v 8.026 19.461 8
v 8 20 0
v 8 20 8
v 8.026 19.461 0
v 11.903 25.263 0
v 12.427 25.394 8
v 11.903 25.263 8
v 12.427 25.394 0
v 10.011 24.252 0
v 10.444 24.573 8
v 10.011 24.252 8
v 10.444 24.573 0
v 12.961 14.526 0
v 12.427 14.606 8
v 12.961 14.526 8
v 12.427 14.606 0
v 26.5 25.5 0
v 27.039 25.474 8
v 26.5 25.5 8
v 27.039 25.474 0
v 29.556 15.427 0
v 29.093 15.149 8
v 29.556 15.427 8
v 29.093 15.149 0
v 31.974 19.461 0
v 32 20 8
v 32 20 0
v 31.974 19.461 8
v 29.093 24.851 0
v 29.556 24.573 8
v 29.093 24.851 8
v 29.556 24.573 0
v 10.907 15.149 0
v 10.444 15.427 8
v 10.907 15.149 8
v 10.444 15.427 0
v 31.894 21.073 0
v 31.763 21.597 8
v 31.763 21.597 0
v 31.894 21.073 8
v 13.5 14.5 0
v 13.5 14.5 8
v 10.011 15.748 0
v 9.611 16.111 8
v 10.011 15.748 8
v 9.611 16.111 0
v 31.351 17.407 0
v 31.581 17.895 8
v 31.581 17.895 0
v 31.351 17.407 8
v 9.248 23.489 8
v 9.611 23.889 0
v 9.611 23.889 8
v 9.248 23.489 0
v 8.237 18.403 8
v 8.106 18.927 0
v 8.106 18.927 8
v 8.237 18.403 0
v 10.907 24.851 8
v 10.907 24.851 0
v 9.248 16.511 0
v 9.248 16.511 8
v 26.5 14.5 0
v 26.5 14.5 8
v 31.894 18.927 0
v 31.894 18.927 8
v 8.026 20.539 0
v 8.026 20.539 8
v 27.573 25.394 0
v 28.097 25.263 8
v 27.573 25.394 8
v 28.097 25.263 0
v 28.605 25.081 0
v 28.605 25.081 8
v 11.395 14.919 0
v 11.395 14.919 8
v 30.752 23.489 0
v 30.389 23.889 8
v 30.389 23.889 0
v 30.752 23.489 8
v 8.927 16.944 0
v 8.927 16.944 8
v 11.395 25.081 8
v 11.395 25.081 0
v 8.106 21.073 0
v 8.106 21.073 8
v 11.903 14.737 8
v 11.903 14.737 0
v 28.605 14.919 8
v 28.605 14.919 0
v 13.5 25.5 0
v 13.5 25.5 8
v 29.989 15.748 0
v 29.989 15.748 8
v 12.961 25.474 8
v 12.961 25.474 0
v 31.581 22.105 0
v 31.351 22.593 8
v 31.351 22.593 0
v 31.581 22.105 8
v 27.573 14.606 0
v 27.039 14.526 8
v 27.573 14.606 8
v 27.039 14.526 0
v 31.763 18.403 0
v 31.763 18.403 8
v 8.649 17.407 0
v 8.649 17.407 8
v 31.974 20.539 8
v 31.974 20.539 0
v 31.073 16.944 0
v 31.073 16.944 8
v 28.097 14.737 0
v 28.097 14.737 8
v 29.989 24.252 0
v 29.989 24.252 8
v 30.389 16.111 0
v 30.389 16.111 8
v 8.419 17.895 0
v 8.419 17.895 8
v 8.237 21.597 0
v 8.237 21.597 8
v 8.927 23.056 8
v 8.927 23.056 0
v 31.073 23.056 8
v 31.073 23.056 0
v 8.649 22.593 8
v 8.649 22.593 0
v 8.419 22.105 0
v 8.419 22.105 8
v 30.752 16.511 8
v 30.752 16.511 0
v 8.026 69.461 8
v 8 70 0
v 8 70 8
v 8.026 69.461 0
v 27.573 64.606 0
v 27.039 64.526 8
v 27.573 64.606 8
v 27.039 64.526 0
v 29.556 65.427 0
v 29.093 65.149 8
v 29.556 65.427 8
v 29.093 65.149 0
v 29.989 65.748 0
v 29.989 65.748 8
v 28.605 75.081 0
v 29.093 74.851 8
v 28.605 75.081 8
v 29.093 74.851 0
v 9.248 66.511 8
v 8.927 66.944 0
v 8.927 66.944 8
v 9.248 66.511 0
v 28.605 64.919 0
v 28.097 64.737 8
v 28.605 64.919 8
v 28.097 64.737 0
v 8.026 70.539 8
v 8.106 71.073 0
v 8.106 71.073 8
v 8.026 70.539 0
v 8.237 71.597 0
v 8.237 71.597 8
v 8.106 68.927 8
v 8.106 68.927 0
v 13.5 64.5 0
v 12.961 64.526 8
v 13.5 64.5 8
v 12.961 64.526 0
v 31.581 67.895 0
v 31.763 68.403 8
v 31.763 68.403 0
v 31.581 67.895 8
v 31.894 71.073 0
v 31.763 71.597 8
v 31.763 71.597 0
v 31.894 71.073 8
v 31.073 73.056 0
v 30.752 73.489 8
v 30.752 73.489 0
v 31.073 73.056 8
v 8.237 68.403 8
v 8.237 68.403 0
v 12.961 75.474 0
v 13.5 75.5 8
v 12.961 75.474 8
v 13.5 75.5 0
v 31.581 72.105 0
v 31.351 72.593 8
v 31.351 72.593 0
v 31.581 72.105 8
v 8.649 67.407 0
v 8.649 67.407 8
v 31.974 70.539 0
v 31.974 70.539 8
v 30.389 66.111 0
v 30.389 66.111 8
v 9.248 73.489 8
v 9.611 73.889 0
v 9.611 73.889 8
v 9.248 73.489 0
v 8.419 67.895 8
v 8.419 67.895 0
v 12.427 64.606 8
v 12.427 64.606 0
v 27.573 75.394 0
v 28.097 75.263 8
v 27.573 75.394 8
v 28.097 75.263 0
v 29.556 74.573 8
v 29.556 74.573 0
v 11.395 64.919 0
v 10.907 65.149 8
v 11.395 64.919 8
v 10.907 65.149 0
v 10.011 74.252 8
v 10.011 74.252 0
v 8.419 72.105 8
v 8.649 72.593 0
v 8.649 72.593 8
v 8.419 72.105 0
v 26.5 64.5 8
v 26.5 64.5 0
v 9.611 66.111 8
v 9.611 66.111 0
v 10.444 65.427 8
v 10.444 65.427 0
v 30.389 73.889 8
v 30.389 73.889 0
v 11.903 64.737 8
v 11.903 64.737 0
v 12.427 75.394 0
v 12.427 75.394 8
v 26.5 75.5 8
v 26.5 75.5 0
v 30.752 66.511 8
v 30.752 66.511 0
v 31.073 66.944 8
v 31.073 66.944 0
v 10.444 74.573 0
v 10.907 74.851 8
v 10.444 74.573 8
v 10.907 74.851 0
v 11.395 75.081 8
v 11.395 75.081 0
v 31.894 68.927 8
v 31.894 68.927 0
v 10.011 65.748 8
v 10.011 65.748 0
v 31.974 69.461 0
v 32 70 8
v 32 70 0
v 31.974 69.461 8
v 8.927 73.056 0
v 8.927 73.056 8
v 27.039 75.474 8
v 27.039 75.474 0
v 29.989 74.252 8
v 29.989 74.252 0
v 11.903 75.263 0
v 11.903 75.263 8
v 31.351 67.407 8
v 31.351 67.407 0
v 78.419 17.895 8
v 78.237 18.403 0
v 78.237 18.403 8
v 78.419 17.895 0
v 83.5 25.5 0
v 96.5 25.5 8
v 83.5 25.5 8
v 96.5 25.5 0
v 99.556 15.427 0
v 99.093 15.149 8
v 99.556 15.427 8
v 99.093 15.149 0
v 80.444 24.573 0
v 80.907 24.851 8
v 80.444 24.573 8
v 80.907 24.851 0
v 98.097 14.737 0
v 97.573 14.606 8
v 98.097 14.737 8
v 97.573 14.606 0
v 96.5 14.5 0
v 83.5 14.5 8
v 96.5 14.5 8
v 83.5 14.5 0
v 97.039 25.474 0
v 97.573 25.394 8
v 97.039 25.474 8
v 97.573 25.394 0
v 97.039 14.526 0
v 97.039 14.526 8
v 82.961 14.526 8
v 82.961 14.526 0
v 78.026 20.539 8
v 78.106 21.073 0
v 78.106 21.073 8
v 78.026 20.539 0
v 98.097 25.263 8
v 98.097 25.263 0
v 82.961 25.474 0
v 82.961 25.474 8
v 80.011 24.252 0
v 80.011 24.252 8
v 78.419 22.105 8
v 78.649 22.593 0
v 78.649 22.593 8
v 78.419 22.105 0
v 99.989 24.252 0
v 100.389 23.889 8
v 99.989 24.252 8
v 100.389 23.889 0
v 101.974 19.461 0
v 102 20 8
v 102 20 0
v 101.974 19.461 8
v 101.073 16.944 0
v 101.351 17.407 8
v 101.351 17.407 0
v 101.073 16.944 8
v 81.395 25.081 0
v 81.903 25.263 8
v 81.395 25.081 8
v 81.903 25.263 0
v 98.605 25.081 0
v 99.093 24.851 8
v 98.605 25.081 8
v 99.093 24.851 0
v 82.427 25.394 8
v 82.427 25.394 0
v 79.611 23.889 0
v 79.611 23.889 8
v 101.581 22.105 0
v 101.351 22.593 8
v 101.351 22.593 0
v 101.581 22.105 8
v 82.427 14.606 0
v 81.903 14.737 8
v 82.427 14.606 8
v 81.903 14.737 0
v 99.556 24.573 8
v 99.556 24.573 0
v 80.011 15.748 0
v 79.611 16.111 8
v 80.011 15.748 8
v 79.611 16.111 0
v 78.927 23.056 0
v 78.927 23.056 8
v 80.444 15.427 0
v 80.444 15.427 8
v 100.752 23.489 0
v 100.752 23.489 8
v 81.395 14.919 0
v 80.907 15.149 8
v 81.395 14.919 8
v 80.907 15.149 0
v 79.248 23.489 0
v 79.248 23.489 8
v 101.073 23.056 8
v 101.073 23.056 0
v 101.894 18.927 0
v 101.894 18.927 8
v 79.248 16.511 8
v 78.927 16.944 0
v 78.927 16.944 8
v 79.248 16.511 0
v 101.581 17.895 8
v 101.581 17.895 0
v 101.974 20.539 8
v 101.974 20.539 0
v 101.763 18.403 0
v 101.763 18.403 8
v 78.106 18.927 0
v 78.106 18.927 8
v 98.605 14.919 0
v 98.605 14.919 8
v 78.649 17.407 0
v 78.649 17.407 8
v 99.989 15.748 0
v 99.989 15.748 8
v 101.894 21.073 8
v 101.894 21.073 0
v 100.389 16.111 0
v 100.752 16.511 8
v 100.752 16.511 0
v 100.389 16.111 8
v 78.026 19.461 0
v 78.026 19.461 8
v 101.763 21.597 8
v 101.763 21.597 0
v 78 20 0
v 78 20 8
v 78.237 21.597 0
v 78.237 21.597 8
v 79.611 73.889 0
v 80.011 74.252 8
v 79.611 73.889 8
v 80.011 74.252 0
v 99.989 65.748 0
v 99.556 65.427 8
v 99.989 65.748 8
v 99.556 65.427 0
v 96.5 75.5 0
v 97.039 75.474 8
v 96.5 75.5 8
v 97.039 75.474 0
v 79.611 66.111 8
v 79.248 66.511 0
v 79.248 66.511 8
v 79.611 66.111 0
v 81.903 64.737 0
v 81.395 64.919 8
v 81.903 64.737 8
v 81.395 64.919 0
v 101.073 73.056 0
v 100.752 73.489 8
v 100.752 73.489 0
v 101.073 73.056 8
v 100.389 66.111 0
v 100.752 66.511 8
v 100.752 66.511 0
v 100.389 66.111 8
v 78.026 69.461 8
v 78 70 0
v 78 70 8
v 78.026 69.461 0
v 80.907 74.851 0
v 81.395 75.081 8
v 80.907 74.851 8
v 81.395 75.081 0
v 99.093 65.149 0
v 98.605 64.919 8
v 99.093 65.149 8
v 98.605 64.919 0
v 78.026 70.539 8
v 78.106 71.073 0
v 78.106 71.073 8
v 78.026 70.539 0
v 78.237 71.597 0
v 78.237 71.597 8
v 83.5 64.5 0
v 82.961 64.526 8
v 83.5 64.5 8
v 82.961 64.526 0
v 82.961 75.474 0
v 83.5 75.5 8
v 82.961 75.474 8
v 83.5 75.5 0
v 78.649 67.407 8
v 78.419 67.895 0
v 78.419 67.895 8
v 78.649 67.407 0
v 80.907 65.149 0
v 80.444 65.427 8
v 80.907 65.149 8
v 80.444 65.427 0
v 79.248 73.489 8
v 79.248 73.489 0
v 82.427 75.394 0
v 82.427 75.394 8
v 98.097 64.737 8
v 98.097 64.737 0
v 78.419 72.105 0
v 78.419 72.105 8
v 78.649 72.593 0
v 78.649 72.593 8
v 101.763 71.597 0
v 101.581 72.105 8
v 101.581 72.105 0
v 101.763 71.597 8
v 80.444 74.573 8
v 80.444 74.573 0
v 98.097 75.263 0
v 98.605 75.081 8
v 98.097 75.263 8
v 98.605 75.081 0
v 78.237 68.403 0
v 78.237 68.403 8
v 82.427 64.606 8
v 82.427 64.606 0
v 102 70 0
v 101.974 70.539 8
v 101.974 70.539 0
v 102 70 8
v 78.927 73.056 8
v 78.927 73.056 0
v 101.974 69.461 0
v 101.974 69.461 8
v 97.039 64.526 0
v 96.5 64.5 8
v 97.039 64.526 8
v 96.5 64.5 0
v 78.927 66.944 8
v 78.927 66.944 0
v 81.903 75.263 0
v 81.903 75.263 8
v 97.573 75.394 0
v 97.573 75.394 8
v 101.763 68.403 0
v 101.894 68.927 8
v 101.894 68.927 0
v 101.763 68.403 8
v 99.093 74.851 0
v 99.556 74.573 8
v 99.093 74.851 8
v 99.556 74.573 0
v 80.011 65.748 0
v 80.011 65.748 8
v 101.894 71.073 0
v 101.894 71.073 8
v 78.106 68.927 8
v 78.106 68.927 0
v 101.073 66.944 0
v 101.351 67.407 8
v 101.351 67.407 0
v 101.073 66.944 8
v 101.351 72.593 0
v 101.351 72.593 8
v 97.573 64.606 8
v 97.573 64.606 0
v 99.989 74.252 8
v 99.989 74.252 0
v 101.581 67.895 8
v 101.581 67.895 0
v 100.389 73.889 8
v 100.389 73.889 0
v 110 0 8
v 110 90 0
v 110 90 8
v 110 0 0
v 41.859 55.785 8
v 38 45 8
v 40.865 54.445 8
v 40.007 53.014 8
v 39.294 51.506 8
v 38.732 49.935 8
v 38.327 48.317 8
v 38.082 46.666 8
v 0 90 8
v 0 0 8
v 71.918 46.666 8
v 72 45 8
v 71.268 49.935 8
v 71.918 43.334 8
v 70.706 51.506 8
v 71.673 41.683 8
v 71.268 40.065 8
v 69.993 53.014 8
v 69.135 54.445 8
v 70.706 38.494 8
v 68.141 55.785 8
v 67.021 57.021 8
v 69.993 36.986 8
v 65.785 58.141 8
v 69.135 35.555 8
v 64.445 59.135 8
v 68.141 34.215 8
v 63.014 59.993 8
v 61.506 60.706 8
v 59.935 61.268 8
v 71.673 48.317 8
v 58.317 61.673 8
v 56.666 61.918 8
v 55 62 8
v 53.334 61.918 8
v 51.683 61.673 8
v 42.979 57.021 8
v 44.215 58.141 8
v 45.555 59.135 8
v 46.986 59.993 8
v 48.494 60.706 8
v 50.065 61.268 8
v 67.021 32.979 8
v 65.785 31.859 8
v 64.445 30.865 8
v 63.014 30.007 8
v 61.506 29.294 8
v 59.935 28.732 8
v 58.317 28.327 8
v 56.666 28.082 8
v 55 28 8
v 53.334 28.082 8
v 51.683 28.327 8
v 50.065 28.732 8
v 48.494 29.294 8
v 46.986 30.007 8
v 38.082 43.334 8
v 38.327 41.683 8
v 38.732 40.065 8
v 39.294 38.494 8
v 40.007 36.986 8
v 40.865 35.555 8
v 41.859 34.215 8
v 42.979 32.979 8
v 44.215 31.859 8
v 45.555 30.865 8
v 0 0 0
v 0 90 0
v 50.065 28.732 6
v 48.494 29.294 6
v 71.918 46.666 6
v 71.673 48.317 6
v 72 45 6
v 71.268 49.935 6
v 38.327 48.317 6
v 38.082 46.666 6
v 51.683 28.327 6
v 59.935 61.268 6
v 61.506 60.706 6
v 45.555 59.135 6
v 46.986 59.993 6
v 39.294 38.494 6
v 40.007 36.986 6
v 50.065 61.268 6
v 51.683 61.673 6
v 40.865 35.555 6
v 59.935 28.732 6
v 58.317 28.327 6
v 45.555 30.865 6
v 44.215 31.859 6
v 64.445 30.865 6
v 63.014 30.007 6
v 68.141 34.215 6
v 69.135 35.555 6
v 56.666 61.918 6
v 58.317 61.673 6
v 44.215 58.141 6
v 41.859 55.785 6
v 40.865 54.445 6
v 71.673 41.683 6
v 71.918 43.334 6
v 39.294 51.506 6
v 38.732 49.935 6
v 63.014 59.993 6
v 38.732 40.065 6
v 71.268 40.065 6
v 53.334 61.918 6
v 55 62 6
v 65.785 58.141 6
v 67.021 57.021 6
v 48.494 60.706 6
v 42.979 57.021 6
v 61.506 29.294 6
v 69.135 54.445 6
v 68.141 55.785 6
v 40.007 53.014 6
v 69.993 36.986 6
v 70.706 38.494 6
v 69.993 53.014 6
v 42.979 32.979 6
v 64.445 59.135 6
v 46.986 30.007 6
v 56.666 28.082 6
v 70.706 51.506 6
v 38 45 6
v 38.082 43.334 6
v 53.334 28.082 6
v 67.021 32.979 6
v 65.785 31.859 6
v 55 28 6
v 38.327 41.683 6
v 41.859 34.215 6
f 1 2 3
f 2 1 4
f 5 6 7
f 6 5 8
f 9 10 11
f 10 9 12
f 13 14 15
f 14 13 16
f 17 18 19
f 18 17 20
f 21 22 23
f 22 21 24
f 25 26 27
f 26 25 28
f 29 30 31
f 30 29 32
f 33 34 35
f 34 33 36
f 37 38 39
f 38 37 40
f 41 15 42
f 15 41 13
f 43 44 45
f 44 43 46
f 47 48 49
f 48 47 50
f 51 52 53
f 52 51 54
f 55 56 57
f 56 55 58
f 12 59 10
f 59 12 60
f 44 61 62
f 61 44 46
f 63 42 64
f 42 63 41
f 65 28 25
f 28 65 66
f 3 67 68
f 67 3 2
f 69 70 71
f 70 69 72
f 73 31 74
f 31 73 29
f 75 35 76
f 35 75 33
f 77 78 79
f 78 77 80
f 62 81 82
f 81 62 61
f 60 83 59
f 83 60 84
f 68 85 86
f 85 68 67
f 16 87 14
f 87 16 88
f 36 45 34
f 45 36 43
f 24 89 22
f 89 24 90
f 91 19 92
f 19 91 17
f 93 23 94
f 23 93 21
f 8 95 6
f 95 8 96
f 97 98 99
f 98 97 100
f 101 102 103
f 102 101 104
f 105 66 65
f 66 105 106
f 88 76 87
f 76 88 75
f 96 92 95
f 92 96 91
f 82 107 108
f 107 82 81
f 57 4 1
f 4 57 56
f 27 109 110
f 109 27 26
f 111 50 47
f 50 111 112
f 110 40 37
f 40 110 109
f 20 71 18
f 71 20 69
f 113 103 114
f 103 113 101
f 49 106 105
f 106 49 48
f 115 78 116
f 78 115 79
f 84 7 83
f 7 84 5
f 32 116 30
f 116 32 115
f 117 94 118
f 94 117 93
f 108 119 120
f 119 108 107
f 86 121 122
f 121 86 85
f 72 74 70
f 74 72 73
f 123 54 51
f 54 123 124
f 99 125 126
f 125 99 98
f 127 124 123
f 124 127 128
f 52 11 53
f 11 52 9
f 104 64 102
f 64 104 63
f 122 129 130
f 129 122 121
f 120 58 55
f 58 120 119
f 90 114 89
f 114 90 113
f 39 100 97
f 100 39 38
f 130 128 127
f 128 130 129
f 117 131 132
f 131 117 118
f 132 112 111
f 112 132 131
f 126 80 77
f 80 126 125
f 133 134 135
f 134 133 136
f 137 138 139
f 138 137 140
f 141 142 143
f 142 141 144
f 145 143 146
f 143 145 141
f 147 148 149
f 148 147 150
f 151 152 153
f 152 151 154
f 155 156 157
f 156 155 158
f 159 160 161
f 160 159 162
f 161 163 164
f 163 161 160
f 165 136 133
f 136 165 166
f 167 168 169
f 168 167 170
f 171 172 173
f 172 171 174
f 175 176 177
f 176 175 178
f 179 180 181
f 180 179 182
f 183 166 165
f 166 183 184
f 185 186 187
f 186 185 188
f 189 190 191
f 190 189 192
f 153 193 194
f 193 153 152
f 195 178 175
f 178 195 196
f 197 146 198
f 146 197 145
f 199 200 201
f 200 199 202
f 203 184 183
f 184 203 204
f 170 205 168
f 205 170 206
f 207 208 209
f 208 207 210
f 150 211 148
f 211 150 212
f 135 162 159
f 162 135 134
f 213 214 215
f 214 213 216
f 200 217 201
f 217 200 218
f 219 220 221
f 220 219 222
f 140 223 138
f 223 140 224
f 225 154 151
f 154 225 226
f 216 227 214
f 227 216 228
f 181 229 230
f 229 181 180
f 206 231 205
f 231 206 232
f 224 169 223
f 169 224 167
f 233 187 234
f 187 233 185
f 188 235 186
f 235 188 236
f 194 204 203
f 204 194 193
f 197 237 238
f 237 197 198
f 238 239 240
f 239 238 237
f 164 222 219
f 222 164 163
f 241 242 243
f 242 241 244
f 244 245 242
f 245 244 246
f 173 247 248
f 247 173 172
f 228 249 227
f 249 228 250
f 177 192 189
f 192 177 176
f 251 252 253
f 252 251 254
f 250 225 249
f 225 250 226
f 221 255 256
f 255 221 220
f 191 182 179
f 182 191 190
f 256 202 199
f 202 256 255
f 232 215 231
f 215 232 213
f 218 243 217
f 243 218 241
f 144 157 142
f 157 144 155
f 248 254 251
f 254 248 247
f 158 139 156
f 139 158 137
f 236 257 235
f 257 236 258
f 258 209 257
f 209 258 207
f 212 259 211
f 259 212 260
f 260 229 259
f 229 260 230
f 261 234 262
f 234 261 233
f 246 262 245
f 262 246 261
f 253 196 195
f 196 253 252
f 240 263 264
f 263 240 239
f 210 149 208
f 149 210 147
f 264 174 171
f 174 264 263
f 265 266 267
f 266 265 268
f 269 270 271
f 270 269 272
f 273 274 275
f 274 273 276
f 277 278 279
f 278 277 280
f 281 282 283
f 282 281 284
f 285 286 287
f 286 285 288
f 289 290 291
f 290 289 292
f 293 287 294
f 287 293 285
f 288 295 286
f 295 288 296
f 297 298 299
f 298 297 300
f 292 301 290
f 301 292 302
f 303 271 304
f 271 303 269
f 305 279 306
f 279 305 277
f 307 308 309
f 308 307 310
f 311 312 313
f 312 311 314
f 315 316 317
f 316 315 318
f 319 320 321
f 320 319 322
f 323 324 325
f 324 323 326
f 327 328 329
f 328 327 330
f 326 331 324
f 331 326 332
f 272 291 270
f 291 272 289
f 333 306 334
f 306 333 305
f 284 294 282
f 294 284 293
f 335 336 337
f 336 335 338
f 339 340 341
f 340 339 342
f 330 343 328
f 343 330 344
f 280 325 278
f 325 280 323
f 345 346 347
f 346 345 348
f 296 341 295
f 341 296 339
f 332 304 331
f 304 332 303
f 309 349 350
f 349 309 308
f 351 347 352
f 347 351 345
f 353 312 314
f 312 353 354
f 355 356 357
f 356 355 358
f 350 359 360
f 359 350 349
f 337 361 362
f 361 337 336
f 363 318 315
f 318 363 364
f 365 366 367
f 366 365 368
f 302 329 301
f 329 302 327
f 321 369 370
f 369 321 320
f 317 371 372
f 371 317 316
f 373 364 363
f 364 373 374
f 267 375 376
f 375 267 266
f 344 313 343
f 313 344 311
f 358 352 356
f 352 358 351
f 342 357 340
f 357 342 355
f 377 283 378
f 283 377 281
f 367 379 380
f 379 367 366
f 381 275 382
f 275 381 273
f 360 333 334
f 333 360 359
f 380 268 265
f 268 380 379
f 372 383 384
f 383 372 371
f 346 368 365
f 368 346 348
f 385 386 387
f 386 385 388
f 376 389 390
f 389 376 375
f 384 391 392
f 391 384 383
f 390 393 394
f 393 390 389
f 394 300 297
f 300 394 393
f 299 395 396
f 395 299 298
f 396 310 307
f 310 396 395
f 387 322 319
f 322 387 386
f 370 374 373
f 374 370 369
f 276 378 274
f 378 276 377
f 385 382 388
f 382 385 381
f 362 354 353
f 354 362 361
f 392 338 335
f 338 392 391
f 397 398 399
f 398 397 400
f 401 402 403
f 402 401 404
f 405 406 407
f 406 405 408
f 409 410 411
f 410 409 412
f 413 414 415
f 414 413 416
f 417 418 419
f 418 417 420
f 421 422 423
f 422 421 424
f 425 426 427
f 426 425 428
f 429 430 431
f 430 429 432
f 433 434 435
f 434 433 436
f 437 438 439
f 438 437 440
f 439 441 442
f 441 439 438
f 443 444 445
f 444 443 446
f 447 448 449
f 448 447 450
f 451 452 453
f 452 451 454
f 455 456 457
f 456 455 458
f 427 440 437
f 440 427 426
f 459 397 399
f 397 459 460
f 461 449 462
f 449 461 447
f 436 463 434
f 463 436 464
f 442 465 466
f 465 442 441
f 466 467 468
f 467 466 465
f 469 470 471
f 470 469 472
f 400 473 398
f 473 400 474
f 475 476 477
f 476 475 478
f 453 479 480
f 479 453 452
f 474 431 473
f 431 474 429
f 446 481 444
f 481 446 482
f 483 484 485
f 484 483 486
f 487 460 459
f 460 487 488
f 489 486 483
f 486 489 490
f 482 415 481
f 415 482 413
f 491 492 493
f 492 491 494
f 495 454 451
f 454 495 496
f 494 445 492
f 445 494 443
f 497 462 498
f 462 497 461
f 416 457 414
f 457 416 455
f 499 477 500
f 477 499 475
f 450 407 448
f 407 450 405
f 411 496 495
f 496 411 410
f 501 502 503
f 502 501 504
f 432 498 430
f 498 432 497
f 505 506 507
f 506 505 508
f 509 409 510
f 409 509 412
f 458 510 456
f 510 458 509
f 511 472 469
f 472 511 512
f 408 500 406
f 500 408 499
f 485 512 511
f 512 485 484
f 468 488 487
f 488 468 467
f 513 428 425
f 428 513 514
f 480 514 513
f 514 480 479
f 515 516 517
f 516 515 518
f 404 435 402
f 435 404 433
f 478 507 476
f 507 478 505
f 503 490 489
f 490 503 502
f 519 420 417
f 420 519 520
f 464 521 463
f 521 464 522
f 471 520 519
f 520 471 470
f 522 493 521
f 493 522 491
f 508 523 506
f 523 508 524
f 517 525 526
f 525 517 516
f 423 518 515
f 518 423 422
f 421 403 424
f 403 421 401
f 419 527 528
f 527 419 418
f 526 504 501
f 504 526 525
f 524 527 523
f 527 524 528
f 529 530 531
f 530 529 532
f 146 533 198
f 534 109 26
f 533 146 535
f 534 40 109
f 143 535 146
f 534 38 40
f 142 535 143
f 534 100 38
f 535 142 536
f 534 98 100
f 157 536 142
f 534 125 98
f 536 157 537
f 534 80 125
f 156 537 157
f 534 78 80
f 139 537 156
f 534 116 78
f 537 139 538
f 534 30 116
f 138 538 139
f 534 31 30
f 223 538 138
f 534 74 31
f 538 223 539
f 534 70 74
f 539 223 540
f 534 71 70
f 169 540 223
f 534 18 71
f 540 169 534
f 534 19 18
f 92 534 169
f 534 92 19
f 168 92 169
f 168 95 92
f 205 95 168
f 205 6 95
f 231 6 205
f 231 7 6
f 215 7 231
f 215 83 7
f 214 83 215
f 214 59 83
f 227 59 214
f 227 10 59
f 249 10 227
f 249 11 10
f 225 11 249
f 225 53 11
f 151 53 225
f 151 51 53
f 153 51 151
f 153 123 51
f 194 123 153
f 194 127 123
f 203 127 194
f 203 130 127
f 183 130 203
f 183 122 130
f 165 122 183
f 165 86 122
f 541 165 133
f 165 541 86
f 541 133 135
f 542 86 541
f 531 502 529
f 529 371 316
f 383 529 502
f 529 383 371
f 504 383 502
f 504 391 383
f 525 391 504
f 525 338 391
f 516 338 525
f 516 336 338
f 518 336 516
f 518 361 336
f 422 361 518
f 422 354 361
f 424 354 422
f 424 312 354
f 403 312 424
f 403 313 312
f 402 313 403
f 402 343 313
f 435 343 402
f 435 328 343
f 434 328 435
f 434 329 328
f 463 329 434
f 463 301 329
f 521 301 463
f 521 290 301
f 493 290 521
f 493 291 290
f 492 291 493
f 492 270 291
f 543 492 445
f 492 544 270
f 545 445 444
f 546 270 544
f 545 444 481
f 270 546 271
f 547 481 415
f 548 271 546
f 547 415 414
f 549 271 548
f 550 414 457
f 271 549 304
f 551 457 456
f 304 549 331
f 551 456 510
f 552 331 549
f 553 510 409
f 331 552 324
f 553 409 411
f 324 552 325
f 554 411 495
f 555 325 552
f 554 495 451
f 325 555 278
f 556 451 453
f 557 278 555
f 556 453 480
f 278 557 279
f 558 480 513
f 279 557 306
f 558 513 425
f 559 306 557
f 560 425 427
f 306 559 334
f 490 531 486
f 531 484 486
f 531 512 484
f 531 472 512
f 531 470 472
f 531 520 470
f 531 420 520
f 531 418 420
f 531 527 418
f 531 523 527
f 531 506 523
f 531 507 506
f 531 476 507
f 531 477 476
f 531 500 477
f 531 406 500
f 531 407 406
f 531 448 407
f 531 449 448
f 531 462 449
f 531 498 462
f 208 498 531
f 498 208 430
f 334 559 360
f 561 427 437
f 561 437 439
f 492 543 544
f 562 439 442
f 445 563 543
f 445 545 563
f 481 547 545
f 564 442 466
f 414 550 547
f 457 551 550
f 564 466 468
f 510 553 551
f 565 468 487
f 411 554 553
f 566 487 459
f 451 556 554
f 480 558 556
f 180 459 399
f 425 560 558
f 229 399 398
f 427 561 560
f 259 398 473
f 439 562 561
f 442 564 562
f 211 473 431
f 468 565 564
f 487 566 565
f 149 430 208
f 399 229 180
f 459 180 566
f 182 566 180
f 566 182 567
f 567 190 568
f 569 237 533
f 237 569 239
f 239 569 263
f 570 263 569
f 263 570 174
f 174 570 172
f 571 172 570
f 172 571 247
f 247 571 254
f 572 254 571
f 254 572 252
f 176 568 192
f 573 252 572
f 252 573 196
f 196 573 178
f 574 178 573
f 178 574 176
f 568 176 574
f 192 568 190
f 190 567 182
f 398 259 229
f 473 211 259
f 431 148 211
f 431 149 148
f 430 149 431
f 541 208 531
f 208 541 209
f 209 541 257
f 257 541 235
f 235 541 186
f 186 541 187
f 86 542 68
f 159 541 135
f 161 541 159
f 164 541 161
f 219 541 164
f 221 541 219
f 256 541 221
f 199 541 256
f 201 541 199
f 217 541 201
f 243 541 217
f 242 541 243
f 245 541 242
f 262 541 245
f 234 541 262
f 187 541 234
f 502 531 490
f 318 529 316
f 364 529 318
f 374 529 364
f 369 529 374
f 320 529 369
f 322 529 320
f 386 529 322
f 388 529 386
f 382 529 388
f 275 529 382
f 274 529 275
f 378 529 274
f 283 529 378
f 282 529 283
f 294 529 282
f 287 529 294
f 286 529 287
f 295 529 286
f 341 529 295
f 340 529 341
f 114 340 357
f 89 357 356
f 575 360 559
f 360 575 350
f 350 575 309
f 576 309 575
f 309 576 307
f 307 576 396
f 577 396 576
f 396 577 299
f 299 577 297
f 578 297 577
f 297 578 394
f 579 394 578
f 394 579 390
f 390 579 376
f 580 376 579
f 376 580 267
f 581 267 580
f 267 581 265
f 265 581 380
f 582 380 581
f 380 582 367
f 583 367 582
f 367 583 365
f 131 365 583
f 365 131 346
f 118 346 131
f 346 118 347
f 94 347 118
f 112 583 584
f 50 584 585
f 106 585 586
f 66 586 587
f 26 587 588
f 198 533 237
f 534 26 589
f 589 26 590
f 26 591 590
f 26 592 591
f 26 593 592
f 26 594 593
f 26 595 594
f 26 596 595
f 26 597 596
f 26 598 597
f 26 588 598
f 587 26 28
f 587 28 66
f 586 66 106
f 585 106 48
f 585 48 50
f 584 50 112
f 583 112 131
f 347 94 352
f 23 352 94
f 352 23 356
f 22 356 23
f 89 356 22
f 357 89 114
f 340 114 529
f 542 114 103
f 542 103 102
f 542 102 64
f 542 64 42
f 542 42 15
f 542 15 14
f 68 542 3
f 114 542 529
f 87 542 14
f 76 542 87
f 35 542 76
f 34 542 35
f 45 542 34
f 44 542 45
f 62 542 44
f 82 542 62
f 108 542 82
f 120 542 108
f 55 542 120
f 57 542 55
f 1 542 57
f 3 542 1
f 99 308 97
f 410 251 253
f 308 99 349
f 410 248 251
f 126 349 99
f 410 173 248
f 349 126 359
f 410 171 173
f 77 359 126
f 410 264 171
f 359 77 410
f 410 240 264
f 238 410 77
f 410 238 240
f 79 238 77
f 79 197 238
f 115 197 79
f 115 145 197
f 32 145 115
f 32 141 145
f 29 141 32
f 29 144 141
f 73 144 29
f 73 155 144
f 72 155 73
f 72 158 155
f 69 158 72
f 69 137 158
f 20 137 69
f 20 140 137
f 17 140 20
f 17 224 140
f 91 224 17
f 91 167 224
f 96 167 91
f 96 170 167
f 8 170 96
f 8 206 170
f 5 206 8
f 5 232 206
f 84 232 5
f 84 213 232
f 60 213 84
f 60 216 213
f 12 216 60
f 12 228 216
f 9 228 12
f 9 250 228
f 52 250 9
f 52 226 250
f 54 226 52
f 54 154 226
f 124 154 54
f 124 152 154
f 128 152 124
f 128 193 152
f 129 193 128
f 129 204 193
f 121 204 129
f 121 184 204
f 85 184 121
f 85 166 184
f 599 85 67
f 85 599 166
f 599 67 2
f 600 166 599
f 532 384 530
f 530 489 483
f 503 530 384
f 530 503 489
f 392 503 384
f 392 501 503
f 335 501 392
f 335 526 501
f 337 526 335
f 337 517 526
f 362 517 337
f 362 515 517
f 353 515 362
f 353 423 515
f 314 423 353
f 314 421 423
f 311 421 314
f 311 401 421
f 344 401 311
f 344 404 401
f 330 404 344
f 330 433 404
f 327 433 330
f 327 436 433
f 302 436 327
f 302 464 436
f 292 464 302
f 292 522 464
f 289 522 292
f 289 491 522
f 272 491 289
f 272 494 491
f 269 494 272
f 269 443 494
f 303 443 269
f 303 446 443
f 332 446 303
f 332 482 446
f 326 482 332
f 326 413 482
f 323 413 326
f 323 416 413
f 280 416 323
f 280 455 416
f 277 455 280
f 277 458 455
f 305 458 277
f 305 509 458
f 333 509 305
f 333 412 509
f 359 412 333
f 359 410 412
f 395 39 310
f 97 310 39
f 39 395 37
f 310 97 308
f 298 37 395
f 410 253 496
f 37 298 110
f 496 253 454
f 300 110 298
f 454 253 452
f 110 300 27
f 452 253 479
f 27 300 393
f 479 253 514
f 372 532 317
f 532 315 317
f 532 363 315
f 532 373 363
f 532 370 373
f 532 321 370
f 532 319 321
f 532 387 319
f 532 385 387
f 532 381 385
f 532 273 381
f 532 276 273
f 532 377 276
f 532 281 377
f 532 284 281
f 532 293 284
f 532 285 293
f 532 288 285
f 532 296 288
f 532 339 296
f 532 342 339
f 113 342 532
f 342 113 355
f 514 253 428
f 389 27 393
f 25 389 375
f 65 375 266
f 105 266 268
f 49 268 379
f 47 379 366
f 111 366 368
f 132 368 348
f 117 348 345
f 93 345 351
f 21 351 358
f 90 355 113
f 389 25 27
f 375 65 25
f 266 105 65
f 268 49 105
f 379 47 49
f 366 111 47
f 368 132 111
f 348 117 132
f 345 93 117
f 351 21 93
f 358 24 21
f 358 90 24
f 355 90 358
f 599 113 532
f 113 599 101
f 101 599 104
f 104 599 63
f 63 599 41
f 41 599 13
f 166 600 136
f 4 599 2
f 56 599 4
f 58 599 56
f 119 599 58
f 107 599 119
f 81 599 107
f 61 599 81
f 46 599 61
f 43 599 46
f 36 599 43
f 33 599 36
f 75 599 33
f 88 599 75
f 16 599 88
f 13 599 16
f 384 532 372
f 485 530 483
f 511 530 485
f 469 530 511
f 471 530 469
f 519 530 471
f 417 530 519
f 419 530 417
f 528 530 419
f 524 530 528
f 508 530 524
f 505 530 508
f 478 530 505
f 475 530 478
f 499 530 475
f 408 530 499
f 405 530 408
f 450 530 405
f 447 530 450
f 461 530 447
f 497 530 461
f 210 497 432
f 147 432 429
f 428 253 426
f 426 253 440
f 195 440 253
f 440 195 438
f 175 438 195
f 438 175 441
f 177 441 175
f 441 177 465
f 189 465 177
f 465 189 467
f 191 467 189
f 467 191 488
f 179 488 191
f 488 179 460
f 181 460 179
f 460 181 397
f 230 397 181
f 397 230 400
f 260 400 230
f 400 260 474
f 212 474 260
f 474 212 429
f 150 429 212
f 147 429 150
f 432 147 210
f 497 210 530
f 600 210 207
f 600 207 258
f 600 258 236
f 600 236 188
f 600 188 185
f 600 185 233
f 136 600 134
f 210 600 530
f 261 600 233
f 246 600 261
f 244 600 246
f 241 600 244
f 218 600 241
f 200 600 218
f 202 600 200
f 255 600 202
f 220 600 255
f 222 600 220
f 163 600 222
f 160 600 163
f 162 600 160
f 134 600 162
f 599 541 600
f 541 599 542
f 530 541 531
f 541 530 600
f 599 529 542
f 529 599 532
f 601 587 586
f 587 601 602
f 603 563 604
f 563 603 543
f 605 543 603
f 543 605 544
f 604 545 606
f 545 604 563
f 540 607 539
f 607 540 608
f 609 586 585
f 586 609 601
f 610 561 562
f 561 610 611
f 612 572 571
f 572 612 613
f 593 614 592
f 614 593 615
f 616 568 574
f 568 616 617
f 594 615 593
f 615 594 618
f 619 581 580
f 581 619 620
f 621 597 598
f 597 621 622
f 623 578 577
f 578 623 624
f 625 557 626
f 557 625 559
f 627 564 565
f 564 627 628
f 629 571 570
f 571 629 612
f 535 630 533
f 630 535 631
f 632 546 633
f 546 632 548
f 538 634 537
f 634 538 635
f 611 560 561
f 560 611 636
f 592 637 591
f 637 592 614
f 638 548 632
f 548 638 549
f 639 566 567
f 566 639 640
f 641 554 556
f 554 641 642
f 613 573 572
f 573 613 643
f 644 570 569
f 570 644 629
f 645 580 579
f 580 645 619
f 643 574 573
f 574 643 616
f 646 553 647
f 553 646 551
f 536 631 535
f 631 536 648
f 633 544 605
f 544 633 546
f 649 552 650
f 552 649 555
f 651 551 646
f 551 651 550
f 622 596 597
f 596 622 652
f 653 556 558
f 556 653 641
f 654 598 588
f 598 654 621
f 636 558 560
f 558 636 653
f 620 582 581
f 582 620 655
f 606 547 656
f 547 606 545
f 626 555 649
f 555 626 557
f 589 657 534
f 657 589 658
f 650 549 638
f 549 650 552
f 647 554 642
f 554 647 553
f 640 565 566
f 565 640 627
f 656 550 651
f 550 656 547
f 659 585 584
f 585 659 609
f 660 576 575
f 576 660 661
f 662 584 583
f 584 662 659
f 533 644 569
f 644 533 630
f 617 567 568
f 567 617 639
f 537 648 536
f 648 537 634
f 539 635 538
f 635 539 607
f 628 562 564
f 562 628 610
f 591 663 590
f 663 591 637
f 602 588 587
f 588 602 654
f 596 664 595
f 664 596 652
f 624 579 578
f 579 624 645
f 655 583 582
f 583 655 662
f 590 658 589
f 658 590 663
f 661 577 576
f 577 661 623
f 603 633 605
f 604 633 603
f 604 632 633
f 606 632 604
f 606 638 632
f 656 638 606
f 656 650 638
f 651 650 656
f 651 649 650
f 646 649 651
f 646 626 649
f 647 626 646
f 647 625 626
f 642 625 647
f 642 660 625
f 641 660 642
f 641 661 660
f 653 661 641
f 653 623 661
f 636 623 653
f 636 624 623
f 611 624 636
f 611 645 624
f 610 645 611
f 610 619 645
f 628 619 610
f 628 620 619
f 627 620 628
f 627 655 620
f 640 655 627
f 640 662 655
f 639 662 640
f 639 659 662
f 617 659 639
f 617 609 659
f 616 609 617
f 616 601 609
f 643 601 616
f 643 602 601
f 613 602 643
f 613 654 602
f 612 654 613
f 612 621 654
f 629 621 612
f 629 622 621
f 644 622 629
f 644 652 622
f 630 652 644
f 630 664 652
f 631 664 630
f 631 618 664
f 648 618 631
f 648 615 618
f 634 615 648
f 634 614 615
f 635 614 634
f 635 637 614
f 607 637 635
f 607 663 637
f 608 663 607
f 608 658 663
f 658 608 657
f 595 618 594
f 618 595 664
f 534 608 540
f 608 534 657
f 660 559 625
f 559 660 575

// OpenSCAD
// Original MechIntel educational model. CC0-1.0. Units: mm.
// Not a standardized or load-rated component.
$fn=96;
length=110; width=90; thickness=8; slot_width=11; slot_length=24; pad_seat=34; seat_depth=2;
$fn=64;
difference(){cube([length,width,thickness]);
 for(x=[20,length-20]) for(y=[20,width-20]) hull(){translate([x-slot_length/2+slot_width/2,y,-1]) cylinder(d=slot_width,h=thickness+2);translate([x+slot_length/2-slot_width/2,y,-1]) cylinder(d=slot_width,h=thickness+2);}
 translate([length/2,width/2,thickness-seat_depth]) cylinder(d=pad_seat,h=seat_depth+1);
}
